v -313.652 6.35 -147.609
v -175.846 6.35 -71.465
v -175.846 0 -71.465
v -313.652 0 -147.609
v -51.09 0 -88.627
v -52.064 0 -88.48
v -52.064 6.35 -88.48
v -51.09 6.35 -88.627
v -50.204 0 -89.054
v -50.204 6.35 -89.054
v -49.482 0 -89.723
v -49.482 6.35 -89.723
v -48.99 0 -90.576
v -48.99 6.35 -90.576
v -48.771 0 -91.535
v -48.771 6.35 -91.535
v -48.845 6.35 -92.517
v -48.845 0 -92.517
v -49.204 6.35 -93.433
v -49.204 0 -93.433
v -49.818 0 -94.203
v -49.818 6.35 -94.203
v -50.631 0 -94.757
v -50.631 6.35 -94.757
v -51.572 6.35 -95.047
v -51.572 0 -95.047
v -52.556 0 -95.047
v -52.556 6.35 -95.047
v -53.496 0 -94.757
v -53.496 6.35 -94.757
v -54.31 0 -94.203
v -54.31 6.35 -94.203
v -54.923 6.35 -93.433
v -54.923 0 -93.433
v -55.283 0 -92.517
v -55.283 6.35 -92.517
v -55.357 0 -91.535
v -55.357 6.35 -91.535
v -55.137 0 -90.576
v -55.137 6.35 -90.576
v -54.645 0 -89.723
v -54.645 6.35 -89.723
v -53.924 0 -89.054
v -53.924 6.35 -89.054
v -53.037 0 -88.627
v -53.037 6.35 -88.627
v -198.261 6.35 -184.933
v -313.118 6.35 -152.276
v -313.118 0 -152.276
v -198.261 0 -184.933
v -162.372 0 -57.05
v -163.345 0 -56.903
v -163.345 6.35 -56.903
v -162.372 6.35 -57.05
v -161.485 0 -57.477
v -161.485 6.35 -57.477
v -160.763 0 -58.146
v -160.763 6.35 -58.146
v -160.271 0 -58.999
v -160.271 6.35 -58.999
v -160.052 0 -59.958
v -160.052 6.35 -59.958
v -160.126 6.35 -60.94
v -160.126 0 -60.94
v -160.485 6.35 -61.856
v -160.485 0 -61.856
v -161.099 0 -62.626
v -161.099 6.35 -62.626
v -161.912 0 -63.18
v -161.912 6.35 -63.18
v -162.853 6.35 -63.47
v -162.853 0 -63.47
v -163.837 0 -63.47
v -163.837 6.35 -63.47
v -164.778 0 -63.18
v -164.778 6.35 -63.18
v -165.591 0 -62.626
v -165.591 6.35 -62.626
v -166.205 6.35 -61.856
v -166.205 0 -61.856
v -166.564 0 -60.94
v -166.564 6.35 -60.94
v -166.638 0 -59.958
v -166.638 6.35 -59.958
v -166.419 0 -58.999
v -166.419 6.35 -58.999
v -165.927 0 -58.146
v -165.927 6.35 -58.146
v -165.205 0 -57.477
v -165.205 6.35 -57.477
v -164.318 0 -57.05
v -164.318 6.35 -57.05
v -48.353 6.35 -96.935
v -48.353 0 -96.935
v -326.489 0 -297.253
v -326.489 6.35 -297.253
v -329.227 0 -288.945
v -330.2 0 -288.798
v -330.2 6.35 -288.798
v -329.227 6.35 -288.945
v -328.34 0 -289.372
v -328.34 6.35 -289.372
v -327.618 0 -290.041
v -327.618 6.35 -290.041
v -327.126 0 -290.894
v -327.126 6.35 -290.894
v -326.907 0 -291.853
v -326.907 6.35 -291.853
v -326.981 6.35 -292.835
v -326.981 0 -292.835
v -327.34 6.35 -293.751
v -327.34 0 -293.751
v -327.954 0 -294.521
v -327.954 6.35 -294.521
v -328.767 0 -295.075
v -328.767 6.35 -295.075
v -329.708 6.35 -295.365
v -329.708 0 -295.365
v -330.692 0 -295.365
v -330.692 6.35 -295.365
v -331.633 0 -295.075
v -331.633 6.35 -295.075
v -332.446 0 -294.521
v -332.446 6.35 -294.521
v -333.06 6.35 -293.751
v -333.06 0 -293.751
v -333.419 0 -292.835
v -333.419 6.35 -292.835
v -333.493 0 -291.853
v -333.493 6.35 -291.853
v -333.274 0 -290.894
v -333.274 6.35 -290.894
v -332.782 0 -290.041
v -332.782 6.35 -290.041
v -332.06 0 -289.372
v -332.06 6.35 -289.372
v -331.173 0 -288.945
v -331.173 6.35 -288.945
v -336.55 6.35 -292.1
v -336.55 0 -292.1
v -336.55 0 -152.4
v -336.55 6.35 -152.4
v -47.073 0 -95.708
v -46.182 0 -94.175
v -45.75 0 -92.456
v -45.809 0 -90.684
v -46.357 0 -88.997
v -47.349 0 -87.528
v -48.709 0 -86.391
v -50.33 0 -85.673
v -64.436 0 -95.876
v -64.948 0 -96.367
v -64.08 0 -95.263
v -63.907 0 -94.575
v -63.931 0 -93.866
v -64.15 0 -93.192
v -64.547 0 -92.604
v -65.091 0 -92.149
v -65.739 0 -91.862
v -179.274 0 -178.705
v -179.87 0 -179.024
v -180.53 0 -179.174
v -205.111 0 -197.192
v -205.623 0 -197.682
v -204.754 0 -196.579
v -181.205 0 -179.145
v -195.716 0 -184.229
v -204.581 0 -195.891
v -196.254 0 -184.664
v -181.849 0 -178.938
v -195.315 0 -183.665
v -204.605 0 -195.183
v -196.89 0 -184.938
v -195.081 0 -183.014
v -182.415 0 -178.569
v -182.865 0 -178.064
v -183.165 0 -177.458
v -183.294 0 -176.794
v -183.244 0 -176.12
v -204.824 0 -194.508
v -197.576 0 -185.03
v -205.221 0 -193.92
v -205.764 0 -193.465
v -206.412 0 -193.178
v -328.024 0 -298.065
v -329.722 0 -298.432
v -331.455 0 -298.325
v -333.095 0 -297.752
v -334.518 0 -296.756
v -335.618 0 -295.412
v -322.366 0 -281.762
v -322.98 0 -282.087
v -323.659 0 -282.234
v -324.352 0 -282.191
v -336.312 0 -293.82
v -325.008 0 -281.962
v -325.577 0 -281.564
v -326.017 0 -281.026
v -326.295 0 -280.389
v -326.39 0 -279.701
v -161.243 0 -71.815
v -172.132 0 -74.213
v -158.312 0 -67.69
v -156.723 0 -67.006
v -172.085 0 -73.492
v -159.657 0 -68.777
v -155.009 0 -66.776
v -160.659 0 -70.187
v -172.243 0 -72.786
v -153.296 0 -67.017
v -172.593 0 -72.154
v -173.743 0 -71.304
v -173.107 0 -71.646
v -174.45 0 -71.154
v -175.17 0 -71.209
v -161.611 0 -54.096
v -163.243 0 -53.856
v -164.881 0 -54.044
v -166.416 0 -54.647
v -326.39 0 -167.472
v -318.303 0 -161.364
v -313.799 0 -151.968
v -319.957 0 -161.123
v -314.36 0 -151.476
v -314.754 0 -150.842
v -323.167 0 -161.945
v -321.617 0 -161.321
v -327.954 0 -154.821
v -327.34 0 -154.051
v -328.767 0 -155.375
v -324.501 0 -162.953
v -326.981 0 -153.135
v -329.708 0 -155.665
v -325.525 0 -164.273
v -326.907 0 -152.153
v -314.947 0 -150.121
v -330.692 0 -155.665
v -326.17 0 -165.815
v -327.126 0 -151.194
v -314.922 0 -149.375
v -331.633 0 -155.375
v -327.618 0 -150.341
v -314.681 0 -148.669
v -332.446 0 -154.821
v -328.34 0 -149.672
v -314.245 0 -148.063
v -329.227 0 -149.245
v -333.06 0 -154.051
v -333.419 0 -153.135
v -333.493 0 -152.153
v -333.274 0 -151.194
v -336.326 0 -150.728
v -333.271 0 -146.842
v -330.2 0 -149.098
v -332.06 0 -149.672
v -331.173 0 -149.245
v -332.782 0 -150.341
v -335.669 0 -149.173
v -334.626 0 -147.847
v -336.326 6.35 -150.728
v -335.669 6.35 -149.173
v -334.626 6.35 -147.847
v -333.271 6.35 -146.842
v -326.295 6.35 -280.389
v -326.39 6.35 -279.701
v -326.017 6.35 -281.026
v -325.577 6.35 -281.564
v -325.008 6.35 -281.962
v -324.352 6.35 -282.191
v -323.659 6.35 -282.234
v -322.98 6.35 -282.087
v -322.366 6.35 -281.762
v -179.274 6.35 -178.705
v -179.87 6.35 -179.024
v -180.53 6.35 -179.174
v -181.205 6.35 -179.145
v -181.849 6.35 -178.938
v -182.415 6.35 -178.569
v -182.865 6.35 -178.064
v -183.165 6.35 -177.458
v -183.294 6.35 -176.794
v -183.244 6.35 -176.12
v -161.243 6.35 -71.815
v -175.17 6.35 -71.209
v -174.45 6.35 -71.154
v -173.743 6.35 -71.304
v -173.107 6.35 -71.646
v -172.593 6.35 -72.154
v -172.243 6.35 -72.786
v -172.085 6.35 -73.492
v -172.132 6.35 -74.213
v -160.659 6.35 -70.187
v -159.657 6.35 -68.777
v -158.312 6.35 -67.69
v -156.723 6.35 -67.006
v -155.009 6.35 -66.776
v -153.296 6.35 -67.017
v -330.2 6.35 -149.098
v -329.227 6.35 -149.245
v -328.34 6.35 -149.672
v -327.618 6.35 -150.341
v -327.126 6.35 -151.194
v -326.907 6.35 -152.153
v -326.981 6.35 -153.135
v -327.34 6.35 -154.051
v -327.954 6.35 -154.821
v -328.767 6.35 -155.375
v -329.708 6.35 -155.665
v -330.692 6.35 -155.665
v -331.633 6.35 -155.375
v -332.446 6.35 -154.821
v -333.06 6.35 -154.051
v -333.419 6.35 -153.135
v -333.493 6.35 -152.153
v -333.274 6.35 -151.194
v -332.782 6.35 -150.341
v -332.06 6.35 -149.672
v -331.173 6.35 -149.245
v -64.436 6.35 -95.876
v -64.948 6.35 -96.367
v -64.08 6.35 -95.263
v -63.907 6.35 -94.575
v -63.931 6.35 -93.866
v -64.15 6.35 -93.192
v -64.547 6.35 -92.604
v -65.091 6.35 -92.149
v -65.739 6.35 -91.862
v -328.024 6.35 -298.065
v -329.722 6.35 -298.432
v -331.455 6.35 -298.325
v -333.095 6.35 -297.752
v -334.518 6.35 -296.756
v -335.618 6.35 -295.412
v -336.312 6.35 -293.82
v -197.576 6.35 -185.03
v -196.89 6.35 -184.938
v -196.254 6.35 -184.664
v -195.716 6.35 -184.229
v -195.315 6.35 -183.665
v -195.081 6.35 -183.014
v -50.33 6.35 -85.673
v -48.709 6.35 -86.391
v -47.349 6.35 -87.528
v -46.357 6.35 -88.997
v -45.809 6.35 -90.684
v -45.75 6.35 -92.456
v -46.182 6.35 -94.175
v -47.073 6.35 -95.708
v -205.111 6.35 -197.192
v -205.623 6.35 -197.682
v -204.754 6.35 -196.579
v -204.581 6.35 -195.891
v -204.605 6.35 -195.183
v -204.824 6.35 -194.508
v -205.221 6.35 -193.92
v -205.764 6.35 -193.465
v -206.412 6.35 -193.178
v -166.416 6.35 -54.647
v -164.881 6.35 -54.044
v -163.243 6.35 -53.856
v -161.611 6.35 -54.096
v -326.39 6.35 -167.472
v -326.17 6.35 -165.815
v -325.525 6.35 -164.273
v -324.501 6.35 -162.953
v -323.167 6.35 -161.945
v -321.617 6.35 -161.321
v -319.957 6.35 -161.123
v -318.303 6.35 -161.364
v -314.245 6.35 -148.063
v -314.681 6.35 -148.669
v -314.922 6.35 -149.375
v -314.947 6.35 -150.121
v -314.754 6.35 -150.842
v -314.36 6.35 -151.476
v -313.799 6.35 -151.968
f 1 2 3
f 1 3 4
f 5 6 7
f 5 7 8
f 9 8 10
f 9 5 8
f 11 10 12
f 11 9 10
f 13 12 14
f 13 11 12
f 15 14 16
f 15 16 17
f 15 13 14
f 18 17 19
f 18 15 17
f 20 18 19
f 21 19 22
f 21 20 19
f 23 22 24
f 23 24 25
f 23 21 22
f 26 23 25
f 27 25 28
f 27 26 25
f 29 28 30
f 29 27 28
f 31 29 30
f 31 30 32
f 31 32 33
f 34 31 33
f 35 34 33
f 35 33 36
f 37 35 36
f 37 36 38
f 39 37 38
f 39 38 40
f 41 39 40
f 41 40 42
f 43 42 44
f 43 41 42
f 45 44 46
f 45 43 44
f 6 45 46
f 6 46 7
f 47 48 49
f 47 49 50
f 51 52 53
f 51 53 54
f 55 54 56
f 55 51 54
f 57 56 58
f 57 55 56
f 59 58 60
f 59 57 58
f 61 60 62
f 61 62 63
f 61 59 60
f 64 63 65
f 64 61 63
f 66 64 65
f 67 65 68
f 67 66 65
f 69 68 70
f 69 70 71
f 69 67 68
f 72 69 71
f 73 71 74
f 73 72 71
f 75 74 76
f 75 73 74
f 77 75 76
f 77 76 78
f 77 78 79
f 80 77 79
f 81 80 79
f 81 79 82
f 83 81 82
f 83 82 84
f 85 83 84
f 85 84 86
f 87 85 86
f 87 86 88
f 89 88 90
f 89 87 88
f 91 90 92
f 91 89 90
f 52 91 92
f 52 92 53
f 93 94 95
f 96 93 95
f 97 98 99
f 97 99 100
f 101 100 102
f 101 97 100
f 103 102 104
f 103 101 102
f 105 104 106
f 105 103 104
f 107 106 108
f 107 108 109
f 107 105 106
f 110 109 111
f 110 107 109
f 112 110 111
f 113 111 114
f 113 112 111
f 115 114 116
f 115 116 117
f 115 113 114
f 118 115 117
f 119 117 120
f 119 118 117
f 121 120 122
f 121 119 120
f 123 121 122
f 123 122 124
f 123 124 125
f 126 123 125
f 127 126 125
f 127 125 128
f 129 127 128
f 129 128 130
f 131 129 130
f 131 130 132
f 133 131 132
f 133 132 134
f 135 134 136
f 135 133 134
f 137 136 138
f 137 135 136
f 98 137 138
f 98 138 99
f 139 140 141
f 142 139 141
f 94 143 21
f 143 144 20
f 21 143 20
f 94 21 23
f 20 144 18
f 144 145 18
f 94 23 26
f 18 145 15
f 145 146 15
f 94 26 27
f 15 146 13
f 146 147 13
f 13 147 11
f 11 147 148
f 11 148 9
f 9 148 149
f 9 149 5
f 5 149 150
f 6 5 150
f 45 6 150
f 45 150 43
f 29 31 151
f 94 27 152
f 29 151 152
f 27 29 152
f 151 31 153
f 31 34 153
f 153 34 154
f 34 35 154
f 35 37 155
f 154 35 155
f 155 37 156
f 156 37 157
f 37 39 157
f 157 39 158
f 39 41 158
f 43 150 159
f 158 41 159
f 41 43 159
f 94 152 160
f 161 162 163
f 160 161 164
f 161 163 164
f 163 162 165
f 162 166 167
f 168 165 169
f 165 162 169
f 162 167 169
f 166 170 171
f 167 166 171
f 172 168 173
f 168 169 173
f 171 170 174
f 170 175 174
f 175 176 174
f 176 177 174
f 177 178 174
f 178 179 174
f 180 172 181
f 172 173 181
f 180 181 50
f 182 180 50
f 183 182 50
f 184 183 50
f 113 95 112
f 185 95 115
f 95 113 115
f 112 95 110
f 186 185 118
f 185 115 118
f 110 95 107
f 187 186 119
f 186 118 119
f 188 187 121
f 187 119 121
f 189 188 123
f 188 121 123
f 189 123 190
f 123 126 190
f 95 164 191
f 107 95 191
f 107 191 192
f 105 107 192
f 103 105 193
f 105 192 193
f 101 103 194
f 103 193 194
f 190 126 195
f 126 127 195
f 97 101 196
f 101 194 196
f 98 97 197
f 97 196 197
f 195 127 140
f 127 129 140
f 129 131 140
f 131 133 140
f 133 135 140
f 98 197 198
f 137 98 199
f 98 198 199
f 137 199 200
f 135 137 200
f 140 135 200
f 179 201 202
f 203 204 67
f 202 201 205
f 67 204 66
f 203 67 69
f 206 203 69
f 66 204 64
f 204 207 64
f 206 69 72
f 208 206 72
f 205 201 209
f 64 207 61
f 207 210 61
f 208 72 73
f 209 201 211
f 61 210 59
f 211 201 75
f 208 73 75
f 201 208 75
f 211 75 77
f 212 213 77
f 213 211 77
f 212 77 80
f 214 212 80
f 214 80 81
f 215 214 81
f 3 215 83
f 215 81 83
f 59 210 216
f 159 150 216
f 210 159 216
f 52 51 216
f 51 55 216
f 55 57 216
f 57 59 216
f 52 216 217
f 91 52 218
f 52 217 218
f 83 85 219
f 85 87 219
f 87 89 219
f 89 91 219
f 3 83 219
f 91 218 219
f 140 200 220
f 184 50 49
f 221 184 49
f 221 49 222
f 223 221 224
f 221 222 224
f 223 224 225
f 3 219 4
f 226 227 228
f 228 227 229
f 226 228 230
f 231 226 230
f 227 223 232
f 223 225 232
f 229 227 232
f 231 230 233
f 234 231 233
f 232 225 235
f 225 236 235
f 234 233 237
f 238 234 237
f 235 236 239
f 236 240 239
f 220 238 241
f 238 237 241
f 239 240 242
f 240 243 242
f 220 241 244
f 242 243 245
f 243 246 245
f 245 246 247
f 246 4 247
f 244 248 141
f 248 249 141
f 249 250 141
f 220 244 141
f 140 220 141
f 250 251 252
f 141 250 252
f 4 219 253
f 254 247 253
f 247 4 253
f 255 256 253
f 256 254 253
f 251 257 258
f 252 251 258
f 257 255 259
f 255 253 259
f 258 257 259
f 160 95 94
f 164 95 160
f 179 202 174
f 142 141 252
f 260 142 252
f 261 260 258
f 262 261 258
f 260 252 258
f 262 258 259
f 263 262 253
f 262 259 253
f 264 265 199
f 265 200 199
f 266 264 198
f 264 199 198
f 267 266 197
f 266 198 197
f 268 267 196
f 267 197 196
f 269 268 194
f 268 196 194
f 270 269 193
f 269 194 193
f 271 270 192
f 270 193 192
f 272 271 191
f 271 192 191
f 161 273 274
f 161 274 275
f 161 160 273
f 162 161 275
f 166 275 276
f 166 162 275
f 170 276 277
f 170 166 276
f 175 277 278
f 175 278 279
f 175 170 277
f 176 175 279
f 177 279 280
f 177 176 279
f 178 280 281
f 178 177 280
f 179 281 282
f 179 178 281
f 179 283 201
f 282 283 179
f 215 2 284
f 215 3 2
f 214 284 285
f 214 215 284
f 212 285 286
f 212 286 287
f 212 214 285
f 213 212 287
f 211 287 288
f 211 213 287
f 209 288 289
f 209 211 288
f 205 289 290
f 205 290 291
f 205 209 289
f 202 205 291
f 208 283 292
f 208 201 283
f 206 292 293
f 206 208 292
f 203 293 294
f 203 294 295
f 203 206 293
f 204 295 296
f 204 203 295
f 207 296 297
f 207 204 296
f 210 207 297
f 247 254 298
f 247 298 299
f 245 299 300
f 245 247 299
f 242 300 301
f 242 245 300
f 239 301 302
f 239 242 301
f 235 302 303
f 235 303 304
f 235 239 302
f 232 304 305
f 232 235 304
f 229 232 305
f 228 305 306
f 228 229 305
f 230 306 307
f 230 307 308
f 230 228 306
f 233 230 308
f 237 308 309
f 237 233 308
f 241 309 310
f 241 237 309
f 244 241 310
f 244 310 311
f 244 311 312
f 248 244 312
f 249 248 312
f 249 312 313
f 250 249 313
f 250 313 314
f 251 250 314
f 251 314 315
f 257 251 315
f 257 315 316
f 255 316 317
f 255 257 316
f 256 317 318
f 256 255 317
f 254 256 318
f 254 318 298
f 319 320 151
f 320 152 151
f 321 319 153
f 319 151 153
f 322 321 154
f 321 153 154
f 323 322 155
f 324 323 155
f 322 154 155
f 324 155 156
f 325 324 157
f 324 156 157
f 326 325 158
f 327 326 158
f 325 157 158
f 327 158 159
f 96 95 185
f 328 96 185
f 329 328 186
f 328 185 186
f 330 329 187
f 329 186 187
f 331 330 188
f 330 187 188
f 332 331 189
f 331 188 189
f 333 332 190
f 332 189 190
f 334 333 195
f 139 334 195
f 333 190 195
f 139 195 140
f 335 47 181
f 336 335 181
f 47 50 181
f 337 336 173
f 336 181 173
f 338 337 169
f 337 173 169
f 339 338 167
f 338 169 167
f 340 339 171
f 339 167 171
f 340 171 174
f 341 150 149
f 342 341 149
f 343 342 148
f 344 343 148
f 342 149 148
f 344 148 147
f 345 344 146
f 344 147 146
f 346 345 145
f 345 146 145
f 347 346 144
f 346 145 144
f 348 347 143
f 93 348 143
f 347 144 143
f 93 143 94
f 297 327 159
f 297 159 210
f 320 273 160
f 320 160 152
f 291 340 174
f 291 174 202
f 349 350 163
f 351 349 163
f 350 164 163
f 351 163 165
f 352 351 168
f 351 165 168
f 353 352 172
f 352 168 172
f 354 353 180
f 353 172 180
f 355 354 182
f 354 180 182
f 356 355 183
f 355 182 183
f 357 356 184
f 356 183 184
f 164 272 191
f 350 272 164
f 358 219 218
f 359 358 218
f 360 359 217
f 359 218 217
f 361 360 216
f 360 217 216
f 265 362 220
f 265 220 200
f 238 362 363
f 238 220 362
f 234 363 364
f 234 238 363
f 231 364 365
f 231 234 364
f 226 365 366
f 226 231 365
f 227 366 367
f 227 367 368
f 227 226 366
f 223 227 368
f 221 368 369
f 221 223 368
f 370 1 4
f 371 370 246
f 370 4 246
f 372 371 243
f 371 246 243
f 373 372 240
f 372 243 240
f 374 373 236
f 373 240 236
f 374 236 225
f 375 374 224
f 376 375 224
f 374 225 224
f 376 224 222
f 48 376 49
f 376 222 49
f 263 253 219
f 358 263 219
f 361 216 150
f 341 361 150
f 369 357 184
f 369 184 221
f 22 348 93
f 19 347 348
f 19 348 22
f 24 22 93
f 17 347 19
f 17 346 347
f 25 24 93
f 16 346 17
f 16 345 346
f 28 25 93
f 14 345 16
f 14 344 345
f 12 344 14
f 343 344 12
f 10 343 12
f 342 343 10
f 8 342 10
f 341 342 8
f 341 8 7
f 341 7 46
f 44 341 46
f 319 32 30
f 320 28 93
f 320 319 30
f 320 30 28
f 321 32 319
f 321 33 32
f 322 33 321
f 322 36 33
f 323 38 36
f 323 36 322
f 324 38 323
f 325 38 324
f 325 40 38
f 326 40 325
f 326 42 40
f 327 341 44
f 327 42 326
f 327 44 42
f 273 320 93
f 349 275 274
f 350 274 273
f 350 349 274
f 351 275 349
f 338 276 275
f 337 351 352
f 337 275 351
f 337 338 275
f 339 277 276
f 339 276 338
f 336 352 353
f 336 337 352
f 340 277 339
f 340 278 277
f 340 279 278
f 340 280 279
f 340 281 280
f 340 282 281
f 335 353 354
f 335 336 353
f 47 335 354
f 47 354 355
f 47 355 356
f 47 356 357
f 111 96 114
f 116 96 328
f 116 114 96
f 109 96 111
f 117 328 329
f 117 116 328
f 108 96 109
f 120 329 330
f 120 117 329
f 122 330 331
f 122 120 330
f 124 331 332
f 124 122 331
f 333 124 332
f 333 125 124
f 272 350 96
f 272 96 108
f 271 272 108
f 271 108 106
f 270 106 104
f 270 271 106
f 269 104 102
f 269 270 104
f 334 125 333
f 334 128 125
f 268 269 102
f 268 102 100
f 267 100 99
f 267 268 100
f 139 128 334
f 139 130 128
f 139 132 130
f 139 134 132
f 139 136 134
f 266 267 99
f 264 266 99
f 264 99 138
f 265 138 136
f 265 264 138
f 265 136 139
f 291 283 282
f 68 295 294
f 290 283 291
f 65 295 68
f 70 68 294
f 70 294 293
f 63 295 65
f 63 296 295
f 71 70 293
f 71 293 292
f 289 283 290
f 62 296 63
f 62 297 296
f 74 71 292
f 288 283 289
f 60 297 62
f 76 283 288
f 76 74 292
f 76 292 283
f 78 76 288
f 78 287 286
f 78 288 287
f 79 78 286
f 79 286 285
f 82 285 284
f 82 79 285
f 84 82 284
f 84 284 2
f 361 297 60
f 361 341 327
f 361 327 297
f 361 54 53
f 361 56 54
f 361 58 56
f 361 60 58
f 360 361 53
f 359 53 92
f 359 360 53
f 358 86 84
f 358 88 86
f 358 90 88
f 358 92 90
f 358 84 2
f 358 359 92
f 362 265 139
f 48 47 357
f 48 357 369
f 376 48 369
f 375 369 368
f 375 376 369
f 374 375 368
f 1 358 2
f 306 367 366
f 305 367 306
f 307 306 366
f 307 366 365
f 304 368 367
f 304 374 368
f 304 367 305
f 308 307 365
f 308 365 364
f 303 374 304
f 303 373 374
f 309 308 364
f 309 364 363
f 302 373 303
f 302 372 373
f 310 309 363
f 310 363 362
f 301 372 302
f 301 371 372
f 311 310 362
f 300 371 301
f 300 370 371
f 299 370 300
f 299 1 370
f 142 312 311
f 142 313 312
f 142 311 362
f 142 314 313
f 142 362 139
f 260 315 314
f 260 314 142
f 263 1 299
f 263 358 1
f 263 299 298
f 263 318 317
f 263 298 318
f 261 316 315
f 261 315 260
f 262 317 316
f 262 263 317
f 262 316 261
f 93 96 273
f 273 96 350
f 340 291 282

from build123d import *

# Parameters (mm, degrees)
SKETCH3_R           = 3.302
BOSS_EXTRUDE2_DEPTH = 6.35
CUT_EXTRUDE3_DEPTH  = 450.865121453
FILLET2_R           = 6.35
FILLET3_R           = 2.54
FILLET4_R           = 2.54
FILLET5_R           = 6.35
FILLET6_R           = 2.54
FILLET7_R           = 2.54


with BuildPart() as part:
    # Sketch3 → Boss-Extrude2 (new body)
    with BuildSketch(Plane(origin=(0, 0, 0), x_dir=(-1, 0, 0), z_dir=(0, 1, 0))):
        with BuildLine():
            Line((48.352684633, -96.934831966), (326.488935594, -297.252717824))
            ThreePointArc((326.488935594, -297.252717824), (333.094584687, -297.751891673), (336.55, -292.1))
            Line((336.55, -292.1), (336.55, -152.4))
            ThreePointArc((336.55, -152.4), (335.66916846, -149.173438927), (333.271040518, -146.842013841))
            Line((333.271040518, -146.842013841), (166.415977763, -54.646991456))
            ThreePointArc((166.415977763, -54.646991456), (164.068228098, -53.896304985), (161.611498988, -54.096156795))
            Line((161.611498988, -54.096156795), (50.330310781, -85.673293323))
            ThreePointArc((50.330310781, -85.673293323), (45.809453277, -90.683804291), (48.352684633, -96.934831966))
        make_face()
        with Locations(Location((52.063749039, -91.782114142, 0), (0, 0, 90))):
            Circle(SKETCH3_R, mode=Mode.SUBTRACT)
        with Locations(Location((163.344937246, -60.204977615, 0), (0, 0, 90))):
            Circle(SKETCH3_R, mode=Mode.SUBTRACT)
        with Locations(Location((330.2, -152.4, 0), (0, 0, 90))):
            Circle(SKETCH3_R, mode=Mode.SUBTRACT)
        with Locations(Location((330.2, -292.1, 0), (0, 0, 90))):
            Circle(SKETCH3_R, mode=Mode.SUBTRACT)
    extrude(amount=BOSS_EXTRUDE2_DEPTH)

    # Sketch9 → Cut-Extrude3 (cut, through all)
    with BuildSketch(Plane(origin=(0, 6.35, 0), x_dir=(1, 0, 0), z_dir=(0, 1, 0))):
        Polygon((-326.39, 284.660691911), (-201.3623279, 194.613893401), (-326.39, 159.064940036), align=None)
        Polygon((-319.046617377, 150.590173625), (-195.643102449, 185.677332519), (-170.986081265, 68.779983296), align=None)
        Polygon((-184.597750493, 182.539794136), (-60.685190052, 93.296115712), (-159.839017865, 65.160237505), align=None)
    extrude(amount=-CUT_EXTRUDE3_DEPTH, mode=Mode.SUBTRACT)

    # Fillet2
    fillet2_edges = [part.edges().sort_by_distance(p)[0] for p in [
        (-159.839017865, 3.175, -65.160237505),
    ]]
    fillet(fillet2_edges, radius=FILLET2_R)

    # Fillet3
    fillet3_edges = [part.edges().sort_by_distance(p)[0] for p in [
        (-170.986081265, 3.175, -68.779983296),
    ]]
    fillet(fillet3_edges, radius=FILLET3_R)

    # Fillet4
    fillet4_edges = [part.edges().sort_by_distance(p)[0] for p in [
        (-319.046617377, 3.175, -150.590173625),
    ]]
    fillet(fillet4_edges, radius=FILLET4_R)

    # Fillet5
    fillet5_edges = [part.edges().sort_by_distance(p)[0] for p in [
        (-326.39, 3.175, -159.064940036),
    ]]
    fillet(fillet5_edges, radius=FILLET5_R)

    # Fillet6
    fillet6_edges = [part.edges().sort_by_distance(p)[0] for p in [
        (-60.685190052, 3.175, -93.296115712),
        (-326.39, 3.175, -284.660691911),
    ]]
    fillet(fillet6_edges, radius=FILLET6_R)

    # Fillet7
    fillet7_edges = [part.edges().sort_by_distance(p)[0] for p in [
        (-195.643102449, 3.175, -185.677332519),
        (-184.597750493, 3.175, -182.539794136),
        (-201.3623279, 3.175, -194.613893401),
    ]]
    fillet(fillet7_edges, radius=FILLET7_R)


solid = part.part
